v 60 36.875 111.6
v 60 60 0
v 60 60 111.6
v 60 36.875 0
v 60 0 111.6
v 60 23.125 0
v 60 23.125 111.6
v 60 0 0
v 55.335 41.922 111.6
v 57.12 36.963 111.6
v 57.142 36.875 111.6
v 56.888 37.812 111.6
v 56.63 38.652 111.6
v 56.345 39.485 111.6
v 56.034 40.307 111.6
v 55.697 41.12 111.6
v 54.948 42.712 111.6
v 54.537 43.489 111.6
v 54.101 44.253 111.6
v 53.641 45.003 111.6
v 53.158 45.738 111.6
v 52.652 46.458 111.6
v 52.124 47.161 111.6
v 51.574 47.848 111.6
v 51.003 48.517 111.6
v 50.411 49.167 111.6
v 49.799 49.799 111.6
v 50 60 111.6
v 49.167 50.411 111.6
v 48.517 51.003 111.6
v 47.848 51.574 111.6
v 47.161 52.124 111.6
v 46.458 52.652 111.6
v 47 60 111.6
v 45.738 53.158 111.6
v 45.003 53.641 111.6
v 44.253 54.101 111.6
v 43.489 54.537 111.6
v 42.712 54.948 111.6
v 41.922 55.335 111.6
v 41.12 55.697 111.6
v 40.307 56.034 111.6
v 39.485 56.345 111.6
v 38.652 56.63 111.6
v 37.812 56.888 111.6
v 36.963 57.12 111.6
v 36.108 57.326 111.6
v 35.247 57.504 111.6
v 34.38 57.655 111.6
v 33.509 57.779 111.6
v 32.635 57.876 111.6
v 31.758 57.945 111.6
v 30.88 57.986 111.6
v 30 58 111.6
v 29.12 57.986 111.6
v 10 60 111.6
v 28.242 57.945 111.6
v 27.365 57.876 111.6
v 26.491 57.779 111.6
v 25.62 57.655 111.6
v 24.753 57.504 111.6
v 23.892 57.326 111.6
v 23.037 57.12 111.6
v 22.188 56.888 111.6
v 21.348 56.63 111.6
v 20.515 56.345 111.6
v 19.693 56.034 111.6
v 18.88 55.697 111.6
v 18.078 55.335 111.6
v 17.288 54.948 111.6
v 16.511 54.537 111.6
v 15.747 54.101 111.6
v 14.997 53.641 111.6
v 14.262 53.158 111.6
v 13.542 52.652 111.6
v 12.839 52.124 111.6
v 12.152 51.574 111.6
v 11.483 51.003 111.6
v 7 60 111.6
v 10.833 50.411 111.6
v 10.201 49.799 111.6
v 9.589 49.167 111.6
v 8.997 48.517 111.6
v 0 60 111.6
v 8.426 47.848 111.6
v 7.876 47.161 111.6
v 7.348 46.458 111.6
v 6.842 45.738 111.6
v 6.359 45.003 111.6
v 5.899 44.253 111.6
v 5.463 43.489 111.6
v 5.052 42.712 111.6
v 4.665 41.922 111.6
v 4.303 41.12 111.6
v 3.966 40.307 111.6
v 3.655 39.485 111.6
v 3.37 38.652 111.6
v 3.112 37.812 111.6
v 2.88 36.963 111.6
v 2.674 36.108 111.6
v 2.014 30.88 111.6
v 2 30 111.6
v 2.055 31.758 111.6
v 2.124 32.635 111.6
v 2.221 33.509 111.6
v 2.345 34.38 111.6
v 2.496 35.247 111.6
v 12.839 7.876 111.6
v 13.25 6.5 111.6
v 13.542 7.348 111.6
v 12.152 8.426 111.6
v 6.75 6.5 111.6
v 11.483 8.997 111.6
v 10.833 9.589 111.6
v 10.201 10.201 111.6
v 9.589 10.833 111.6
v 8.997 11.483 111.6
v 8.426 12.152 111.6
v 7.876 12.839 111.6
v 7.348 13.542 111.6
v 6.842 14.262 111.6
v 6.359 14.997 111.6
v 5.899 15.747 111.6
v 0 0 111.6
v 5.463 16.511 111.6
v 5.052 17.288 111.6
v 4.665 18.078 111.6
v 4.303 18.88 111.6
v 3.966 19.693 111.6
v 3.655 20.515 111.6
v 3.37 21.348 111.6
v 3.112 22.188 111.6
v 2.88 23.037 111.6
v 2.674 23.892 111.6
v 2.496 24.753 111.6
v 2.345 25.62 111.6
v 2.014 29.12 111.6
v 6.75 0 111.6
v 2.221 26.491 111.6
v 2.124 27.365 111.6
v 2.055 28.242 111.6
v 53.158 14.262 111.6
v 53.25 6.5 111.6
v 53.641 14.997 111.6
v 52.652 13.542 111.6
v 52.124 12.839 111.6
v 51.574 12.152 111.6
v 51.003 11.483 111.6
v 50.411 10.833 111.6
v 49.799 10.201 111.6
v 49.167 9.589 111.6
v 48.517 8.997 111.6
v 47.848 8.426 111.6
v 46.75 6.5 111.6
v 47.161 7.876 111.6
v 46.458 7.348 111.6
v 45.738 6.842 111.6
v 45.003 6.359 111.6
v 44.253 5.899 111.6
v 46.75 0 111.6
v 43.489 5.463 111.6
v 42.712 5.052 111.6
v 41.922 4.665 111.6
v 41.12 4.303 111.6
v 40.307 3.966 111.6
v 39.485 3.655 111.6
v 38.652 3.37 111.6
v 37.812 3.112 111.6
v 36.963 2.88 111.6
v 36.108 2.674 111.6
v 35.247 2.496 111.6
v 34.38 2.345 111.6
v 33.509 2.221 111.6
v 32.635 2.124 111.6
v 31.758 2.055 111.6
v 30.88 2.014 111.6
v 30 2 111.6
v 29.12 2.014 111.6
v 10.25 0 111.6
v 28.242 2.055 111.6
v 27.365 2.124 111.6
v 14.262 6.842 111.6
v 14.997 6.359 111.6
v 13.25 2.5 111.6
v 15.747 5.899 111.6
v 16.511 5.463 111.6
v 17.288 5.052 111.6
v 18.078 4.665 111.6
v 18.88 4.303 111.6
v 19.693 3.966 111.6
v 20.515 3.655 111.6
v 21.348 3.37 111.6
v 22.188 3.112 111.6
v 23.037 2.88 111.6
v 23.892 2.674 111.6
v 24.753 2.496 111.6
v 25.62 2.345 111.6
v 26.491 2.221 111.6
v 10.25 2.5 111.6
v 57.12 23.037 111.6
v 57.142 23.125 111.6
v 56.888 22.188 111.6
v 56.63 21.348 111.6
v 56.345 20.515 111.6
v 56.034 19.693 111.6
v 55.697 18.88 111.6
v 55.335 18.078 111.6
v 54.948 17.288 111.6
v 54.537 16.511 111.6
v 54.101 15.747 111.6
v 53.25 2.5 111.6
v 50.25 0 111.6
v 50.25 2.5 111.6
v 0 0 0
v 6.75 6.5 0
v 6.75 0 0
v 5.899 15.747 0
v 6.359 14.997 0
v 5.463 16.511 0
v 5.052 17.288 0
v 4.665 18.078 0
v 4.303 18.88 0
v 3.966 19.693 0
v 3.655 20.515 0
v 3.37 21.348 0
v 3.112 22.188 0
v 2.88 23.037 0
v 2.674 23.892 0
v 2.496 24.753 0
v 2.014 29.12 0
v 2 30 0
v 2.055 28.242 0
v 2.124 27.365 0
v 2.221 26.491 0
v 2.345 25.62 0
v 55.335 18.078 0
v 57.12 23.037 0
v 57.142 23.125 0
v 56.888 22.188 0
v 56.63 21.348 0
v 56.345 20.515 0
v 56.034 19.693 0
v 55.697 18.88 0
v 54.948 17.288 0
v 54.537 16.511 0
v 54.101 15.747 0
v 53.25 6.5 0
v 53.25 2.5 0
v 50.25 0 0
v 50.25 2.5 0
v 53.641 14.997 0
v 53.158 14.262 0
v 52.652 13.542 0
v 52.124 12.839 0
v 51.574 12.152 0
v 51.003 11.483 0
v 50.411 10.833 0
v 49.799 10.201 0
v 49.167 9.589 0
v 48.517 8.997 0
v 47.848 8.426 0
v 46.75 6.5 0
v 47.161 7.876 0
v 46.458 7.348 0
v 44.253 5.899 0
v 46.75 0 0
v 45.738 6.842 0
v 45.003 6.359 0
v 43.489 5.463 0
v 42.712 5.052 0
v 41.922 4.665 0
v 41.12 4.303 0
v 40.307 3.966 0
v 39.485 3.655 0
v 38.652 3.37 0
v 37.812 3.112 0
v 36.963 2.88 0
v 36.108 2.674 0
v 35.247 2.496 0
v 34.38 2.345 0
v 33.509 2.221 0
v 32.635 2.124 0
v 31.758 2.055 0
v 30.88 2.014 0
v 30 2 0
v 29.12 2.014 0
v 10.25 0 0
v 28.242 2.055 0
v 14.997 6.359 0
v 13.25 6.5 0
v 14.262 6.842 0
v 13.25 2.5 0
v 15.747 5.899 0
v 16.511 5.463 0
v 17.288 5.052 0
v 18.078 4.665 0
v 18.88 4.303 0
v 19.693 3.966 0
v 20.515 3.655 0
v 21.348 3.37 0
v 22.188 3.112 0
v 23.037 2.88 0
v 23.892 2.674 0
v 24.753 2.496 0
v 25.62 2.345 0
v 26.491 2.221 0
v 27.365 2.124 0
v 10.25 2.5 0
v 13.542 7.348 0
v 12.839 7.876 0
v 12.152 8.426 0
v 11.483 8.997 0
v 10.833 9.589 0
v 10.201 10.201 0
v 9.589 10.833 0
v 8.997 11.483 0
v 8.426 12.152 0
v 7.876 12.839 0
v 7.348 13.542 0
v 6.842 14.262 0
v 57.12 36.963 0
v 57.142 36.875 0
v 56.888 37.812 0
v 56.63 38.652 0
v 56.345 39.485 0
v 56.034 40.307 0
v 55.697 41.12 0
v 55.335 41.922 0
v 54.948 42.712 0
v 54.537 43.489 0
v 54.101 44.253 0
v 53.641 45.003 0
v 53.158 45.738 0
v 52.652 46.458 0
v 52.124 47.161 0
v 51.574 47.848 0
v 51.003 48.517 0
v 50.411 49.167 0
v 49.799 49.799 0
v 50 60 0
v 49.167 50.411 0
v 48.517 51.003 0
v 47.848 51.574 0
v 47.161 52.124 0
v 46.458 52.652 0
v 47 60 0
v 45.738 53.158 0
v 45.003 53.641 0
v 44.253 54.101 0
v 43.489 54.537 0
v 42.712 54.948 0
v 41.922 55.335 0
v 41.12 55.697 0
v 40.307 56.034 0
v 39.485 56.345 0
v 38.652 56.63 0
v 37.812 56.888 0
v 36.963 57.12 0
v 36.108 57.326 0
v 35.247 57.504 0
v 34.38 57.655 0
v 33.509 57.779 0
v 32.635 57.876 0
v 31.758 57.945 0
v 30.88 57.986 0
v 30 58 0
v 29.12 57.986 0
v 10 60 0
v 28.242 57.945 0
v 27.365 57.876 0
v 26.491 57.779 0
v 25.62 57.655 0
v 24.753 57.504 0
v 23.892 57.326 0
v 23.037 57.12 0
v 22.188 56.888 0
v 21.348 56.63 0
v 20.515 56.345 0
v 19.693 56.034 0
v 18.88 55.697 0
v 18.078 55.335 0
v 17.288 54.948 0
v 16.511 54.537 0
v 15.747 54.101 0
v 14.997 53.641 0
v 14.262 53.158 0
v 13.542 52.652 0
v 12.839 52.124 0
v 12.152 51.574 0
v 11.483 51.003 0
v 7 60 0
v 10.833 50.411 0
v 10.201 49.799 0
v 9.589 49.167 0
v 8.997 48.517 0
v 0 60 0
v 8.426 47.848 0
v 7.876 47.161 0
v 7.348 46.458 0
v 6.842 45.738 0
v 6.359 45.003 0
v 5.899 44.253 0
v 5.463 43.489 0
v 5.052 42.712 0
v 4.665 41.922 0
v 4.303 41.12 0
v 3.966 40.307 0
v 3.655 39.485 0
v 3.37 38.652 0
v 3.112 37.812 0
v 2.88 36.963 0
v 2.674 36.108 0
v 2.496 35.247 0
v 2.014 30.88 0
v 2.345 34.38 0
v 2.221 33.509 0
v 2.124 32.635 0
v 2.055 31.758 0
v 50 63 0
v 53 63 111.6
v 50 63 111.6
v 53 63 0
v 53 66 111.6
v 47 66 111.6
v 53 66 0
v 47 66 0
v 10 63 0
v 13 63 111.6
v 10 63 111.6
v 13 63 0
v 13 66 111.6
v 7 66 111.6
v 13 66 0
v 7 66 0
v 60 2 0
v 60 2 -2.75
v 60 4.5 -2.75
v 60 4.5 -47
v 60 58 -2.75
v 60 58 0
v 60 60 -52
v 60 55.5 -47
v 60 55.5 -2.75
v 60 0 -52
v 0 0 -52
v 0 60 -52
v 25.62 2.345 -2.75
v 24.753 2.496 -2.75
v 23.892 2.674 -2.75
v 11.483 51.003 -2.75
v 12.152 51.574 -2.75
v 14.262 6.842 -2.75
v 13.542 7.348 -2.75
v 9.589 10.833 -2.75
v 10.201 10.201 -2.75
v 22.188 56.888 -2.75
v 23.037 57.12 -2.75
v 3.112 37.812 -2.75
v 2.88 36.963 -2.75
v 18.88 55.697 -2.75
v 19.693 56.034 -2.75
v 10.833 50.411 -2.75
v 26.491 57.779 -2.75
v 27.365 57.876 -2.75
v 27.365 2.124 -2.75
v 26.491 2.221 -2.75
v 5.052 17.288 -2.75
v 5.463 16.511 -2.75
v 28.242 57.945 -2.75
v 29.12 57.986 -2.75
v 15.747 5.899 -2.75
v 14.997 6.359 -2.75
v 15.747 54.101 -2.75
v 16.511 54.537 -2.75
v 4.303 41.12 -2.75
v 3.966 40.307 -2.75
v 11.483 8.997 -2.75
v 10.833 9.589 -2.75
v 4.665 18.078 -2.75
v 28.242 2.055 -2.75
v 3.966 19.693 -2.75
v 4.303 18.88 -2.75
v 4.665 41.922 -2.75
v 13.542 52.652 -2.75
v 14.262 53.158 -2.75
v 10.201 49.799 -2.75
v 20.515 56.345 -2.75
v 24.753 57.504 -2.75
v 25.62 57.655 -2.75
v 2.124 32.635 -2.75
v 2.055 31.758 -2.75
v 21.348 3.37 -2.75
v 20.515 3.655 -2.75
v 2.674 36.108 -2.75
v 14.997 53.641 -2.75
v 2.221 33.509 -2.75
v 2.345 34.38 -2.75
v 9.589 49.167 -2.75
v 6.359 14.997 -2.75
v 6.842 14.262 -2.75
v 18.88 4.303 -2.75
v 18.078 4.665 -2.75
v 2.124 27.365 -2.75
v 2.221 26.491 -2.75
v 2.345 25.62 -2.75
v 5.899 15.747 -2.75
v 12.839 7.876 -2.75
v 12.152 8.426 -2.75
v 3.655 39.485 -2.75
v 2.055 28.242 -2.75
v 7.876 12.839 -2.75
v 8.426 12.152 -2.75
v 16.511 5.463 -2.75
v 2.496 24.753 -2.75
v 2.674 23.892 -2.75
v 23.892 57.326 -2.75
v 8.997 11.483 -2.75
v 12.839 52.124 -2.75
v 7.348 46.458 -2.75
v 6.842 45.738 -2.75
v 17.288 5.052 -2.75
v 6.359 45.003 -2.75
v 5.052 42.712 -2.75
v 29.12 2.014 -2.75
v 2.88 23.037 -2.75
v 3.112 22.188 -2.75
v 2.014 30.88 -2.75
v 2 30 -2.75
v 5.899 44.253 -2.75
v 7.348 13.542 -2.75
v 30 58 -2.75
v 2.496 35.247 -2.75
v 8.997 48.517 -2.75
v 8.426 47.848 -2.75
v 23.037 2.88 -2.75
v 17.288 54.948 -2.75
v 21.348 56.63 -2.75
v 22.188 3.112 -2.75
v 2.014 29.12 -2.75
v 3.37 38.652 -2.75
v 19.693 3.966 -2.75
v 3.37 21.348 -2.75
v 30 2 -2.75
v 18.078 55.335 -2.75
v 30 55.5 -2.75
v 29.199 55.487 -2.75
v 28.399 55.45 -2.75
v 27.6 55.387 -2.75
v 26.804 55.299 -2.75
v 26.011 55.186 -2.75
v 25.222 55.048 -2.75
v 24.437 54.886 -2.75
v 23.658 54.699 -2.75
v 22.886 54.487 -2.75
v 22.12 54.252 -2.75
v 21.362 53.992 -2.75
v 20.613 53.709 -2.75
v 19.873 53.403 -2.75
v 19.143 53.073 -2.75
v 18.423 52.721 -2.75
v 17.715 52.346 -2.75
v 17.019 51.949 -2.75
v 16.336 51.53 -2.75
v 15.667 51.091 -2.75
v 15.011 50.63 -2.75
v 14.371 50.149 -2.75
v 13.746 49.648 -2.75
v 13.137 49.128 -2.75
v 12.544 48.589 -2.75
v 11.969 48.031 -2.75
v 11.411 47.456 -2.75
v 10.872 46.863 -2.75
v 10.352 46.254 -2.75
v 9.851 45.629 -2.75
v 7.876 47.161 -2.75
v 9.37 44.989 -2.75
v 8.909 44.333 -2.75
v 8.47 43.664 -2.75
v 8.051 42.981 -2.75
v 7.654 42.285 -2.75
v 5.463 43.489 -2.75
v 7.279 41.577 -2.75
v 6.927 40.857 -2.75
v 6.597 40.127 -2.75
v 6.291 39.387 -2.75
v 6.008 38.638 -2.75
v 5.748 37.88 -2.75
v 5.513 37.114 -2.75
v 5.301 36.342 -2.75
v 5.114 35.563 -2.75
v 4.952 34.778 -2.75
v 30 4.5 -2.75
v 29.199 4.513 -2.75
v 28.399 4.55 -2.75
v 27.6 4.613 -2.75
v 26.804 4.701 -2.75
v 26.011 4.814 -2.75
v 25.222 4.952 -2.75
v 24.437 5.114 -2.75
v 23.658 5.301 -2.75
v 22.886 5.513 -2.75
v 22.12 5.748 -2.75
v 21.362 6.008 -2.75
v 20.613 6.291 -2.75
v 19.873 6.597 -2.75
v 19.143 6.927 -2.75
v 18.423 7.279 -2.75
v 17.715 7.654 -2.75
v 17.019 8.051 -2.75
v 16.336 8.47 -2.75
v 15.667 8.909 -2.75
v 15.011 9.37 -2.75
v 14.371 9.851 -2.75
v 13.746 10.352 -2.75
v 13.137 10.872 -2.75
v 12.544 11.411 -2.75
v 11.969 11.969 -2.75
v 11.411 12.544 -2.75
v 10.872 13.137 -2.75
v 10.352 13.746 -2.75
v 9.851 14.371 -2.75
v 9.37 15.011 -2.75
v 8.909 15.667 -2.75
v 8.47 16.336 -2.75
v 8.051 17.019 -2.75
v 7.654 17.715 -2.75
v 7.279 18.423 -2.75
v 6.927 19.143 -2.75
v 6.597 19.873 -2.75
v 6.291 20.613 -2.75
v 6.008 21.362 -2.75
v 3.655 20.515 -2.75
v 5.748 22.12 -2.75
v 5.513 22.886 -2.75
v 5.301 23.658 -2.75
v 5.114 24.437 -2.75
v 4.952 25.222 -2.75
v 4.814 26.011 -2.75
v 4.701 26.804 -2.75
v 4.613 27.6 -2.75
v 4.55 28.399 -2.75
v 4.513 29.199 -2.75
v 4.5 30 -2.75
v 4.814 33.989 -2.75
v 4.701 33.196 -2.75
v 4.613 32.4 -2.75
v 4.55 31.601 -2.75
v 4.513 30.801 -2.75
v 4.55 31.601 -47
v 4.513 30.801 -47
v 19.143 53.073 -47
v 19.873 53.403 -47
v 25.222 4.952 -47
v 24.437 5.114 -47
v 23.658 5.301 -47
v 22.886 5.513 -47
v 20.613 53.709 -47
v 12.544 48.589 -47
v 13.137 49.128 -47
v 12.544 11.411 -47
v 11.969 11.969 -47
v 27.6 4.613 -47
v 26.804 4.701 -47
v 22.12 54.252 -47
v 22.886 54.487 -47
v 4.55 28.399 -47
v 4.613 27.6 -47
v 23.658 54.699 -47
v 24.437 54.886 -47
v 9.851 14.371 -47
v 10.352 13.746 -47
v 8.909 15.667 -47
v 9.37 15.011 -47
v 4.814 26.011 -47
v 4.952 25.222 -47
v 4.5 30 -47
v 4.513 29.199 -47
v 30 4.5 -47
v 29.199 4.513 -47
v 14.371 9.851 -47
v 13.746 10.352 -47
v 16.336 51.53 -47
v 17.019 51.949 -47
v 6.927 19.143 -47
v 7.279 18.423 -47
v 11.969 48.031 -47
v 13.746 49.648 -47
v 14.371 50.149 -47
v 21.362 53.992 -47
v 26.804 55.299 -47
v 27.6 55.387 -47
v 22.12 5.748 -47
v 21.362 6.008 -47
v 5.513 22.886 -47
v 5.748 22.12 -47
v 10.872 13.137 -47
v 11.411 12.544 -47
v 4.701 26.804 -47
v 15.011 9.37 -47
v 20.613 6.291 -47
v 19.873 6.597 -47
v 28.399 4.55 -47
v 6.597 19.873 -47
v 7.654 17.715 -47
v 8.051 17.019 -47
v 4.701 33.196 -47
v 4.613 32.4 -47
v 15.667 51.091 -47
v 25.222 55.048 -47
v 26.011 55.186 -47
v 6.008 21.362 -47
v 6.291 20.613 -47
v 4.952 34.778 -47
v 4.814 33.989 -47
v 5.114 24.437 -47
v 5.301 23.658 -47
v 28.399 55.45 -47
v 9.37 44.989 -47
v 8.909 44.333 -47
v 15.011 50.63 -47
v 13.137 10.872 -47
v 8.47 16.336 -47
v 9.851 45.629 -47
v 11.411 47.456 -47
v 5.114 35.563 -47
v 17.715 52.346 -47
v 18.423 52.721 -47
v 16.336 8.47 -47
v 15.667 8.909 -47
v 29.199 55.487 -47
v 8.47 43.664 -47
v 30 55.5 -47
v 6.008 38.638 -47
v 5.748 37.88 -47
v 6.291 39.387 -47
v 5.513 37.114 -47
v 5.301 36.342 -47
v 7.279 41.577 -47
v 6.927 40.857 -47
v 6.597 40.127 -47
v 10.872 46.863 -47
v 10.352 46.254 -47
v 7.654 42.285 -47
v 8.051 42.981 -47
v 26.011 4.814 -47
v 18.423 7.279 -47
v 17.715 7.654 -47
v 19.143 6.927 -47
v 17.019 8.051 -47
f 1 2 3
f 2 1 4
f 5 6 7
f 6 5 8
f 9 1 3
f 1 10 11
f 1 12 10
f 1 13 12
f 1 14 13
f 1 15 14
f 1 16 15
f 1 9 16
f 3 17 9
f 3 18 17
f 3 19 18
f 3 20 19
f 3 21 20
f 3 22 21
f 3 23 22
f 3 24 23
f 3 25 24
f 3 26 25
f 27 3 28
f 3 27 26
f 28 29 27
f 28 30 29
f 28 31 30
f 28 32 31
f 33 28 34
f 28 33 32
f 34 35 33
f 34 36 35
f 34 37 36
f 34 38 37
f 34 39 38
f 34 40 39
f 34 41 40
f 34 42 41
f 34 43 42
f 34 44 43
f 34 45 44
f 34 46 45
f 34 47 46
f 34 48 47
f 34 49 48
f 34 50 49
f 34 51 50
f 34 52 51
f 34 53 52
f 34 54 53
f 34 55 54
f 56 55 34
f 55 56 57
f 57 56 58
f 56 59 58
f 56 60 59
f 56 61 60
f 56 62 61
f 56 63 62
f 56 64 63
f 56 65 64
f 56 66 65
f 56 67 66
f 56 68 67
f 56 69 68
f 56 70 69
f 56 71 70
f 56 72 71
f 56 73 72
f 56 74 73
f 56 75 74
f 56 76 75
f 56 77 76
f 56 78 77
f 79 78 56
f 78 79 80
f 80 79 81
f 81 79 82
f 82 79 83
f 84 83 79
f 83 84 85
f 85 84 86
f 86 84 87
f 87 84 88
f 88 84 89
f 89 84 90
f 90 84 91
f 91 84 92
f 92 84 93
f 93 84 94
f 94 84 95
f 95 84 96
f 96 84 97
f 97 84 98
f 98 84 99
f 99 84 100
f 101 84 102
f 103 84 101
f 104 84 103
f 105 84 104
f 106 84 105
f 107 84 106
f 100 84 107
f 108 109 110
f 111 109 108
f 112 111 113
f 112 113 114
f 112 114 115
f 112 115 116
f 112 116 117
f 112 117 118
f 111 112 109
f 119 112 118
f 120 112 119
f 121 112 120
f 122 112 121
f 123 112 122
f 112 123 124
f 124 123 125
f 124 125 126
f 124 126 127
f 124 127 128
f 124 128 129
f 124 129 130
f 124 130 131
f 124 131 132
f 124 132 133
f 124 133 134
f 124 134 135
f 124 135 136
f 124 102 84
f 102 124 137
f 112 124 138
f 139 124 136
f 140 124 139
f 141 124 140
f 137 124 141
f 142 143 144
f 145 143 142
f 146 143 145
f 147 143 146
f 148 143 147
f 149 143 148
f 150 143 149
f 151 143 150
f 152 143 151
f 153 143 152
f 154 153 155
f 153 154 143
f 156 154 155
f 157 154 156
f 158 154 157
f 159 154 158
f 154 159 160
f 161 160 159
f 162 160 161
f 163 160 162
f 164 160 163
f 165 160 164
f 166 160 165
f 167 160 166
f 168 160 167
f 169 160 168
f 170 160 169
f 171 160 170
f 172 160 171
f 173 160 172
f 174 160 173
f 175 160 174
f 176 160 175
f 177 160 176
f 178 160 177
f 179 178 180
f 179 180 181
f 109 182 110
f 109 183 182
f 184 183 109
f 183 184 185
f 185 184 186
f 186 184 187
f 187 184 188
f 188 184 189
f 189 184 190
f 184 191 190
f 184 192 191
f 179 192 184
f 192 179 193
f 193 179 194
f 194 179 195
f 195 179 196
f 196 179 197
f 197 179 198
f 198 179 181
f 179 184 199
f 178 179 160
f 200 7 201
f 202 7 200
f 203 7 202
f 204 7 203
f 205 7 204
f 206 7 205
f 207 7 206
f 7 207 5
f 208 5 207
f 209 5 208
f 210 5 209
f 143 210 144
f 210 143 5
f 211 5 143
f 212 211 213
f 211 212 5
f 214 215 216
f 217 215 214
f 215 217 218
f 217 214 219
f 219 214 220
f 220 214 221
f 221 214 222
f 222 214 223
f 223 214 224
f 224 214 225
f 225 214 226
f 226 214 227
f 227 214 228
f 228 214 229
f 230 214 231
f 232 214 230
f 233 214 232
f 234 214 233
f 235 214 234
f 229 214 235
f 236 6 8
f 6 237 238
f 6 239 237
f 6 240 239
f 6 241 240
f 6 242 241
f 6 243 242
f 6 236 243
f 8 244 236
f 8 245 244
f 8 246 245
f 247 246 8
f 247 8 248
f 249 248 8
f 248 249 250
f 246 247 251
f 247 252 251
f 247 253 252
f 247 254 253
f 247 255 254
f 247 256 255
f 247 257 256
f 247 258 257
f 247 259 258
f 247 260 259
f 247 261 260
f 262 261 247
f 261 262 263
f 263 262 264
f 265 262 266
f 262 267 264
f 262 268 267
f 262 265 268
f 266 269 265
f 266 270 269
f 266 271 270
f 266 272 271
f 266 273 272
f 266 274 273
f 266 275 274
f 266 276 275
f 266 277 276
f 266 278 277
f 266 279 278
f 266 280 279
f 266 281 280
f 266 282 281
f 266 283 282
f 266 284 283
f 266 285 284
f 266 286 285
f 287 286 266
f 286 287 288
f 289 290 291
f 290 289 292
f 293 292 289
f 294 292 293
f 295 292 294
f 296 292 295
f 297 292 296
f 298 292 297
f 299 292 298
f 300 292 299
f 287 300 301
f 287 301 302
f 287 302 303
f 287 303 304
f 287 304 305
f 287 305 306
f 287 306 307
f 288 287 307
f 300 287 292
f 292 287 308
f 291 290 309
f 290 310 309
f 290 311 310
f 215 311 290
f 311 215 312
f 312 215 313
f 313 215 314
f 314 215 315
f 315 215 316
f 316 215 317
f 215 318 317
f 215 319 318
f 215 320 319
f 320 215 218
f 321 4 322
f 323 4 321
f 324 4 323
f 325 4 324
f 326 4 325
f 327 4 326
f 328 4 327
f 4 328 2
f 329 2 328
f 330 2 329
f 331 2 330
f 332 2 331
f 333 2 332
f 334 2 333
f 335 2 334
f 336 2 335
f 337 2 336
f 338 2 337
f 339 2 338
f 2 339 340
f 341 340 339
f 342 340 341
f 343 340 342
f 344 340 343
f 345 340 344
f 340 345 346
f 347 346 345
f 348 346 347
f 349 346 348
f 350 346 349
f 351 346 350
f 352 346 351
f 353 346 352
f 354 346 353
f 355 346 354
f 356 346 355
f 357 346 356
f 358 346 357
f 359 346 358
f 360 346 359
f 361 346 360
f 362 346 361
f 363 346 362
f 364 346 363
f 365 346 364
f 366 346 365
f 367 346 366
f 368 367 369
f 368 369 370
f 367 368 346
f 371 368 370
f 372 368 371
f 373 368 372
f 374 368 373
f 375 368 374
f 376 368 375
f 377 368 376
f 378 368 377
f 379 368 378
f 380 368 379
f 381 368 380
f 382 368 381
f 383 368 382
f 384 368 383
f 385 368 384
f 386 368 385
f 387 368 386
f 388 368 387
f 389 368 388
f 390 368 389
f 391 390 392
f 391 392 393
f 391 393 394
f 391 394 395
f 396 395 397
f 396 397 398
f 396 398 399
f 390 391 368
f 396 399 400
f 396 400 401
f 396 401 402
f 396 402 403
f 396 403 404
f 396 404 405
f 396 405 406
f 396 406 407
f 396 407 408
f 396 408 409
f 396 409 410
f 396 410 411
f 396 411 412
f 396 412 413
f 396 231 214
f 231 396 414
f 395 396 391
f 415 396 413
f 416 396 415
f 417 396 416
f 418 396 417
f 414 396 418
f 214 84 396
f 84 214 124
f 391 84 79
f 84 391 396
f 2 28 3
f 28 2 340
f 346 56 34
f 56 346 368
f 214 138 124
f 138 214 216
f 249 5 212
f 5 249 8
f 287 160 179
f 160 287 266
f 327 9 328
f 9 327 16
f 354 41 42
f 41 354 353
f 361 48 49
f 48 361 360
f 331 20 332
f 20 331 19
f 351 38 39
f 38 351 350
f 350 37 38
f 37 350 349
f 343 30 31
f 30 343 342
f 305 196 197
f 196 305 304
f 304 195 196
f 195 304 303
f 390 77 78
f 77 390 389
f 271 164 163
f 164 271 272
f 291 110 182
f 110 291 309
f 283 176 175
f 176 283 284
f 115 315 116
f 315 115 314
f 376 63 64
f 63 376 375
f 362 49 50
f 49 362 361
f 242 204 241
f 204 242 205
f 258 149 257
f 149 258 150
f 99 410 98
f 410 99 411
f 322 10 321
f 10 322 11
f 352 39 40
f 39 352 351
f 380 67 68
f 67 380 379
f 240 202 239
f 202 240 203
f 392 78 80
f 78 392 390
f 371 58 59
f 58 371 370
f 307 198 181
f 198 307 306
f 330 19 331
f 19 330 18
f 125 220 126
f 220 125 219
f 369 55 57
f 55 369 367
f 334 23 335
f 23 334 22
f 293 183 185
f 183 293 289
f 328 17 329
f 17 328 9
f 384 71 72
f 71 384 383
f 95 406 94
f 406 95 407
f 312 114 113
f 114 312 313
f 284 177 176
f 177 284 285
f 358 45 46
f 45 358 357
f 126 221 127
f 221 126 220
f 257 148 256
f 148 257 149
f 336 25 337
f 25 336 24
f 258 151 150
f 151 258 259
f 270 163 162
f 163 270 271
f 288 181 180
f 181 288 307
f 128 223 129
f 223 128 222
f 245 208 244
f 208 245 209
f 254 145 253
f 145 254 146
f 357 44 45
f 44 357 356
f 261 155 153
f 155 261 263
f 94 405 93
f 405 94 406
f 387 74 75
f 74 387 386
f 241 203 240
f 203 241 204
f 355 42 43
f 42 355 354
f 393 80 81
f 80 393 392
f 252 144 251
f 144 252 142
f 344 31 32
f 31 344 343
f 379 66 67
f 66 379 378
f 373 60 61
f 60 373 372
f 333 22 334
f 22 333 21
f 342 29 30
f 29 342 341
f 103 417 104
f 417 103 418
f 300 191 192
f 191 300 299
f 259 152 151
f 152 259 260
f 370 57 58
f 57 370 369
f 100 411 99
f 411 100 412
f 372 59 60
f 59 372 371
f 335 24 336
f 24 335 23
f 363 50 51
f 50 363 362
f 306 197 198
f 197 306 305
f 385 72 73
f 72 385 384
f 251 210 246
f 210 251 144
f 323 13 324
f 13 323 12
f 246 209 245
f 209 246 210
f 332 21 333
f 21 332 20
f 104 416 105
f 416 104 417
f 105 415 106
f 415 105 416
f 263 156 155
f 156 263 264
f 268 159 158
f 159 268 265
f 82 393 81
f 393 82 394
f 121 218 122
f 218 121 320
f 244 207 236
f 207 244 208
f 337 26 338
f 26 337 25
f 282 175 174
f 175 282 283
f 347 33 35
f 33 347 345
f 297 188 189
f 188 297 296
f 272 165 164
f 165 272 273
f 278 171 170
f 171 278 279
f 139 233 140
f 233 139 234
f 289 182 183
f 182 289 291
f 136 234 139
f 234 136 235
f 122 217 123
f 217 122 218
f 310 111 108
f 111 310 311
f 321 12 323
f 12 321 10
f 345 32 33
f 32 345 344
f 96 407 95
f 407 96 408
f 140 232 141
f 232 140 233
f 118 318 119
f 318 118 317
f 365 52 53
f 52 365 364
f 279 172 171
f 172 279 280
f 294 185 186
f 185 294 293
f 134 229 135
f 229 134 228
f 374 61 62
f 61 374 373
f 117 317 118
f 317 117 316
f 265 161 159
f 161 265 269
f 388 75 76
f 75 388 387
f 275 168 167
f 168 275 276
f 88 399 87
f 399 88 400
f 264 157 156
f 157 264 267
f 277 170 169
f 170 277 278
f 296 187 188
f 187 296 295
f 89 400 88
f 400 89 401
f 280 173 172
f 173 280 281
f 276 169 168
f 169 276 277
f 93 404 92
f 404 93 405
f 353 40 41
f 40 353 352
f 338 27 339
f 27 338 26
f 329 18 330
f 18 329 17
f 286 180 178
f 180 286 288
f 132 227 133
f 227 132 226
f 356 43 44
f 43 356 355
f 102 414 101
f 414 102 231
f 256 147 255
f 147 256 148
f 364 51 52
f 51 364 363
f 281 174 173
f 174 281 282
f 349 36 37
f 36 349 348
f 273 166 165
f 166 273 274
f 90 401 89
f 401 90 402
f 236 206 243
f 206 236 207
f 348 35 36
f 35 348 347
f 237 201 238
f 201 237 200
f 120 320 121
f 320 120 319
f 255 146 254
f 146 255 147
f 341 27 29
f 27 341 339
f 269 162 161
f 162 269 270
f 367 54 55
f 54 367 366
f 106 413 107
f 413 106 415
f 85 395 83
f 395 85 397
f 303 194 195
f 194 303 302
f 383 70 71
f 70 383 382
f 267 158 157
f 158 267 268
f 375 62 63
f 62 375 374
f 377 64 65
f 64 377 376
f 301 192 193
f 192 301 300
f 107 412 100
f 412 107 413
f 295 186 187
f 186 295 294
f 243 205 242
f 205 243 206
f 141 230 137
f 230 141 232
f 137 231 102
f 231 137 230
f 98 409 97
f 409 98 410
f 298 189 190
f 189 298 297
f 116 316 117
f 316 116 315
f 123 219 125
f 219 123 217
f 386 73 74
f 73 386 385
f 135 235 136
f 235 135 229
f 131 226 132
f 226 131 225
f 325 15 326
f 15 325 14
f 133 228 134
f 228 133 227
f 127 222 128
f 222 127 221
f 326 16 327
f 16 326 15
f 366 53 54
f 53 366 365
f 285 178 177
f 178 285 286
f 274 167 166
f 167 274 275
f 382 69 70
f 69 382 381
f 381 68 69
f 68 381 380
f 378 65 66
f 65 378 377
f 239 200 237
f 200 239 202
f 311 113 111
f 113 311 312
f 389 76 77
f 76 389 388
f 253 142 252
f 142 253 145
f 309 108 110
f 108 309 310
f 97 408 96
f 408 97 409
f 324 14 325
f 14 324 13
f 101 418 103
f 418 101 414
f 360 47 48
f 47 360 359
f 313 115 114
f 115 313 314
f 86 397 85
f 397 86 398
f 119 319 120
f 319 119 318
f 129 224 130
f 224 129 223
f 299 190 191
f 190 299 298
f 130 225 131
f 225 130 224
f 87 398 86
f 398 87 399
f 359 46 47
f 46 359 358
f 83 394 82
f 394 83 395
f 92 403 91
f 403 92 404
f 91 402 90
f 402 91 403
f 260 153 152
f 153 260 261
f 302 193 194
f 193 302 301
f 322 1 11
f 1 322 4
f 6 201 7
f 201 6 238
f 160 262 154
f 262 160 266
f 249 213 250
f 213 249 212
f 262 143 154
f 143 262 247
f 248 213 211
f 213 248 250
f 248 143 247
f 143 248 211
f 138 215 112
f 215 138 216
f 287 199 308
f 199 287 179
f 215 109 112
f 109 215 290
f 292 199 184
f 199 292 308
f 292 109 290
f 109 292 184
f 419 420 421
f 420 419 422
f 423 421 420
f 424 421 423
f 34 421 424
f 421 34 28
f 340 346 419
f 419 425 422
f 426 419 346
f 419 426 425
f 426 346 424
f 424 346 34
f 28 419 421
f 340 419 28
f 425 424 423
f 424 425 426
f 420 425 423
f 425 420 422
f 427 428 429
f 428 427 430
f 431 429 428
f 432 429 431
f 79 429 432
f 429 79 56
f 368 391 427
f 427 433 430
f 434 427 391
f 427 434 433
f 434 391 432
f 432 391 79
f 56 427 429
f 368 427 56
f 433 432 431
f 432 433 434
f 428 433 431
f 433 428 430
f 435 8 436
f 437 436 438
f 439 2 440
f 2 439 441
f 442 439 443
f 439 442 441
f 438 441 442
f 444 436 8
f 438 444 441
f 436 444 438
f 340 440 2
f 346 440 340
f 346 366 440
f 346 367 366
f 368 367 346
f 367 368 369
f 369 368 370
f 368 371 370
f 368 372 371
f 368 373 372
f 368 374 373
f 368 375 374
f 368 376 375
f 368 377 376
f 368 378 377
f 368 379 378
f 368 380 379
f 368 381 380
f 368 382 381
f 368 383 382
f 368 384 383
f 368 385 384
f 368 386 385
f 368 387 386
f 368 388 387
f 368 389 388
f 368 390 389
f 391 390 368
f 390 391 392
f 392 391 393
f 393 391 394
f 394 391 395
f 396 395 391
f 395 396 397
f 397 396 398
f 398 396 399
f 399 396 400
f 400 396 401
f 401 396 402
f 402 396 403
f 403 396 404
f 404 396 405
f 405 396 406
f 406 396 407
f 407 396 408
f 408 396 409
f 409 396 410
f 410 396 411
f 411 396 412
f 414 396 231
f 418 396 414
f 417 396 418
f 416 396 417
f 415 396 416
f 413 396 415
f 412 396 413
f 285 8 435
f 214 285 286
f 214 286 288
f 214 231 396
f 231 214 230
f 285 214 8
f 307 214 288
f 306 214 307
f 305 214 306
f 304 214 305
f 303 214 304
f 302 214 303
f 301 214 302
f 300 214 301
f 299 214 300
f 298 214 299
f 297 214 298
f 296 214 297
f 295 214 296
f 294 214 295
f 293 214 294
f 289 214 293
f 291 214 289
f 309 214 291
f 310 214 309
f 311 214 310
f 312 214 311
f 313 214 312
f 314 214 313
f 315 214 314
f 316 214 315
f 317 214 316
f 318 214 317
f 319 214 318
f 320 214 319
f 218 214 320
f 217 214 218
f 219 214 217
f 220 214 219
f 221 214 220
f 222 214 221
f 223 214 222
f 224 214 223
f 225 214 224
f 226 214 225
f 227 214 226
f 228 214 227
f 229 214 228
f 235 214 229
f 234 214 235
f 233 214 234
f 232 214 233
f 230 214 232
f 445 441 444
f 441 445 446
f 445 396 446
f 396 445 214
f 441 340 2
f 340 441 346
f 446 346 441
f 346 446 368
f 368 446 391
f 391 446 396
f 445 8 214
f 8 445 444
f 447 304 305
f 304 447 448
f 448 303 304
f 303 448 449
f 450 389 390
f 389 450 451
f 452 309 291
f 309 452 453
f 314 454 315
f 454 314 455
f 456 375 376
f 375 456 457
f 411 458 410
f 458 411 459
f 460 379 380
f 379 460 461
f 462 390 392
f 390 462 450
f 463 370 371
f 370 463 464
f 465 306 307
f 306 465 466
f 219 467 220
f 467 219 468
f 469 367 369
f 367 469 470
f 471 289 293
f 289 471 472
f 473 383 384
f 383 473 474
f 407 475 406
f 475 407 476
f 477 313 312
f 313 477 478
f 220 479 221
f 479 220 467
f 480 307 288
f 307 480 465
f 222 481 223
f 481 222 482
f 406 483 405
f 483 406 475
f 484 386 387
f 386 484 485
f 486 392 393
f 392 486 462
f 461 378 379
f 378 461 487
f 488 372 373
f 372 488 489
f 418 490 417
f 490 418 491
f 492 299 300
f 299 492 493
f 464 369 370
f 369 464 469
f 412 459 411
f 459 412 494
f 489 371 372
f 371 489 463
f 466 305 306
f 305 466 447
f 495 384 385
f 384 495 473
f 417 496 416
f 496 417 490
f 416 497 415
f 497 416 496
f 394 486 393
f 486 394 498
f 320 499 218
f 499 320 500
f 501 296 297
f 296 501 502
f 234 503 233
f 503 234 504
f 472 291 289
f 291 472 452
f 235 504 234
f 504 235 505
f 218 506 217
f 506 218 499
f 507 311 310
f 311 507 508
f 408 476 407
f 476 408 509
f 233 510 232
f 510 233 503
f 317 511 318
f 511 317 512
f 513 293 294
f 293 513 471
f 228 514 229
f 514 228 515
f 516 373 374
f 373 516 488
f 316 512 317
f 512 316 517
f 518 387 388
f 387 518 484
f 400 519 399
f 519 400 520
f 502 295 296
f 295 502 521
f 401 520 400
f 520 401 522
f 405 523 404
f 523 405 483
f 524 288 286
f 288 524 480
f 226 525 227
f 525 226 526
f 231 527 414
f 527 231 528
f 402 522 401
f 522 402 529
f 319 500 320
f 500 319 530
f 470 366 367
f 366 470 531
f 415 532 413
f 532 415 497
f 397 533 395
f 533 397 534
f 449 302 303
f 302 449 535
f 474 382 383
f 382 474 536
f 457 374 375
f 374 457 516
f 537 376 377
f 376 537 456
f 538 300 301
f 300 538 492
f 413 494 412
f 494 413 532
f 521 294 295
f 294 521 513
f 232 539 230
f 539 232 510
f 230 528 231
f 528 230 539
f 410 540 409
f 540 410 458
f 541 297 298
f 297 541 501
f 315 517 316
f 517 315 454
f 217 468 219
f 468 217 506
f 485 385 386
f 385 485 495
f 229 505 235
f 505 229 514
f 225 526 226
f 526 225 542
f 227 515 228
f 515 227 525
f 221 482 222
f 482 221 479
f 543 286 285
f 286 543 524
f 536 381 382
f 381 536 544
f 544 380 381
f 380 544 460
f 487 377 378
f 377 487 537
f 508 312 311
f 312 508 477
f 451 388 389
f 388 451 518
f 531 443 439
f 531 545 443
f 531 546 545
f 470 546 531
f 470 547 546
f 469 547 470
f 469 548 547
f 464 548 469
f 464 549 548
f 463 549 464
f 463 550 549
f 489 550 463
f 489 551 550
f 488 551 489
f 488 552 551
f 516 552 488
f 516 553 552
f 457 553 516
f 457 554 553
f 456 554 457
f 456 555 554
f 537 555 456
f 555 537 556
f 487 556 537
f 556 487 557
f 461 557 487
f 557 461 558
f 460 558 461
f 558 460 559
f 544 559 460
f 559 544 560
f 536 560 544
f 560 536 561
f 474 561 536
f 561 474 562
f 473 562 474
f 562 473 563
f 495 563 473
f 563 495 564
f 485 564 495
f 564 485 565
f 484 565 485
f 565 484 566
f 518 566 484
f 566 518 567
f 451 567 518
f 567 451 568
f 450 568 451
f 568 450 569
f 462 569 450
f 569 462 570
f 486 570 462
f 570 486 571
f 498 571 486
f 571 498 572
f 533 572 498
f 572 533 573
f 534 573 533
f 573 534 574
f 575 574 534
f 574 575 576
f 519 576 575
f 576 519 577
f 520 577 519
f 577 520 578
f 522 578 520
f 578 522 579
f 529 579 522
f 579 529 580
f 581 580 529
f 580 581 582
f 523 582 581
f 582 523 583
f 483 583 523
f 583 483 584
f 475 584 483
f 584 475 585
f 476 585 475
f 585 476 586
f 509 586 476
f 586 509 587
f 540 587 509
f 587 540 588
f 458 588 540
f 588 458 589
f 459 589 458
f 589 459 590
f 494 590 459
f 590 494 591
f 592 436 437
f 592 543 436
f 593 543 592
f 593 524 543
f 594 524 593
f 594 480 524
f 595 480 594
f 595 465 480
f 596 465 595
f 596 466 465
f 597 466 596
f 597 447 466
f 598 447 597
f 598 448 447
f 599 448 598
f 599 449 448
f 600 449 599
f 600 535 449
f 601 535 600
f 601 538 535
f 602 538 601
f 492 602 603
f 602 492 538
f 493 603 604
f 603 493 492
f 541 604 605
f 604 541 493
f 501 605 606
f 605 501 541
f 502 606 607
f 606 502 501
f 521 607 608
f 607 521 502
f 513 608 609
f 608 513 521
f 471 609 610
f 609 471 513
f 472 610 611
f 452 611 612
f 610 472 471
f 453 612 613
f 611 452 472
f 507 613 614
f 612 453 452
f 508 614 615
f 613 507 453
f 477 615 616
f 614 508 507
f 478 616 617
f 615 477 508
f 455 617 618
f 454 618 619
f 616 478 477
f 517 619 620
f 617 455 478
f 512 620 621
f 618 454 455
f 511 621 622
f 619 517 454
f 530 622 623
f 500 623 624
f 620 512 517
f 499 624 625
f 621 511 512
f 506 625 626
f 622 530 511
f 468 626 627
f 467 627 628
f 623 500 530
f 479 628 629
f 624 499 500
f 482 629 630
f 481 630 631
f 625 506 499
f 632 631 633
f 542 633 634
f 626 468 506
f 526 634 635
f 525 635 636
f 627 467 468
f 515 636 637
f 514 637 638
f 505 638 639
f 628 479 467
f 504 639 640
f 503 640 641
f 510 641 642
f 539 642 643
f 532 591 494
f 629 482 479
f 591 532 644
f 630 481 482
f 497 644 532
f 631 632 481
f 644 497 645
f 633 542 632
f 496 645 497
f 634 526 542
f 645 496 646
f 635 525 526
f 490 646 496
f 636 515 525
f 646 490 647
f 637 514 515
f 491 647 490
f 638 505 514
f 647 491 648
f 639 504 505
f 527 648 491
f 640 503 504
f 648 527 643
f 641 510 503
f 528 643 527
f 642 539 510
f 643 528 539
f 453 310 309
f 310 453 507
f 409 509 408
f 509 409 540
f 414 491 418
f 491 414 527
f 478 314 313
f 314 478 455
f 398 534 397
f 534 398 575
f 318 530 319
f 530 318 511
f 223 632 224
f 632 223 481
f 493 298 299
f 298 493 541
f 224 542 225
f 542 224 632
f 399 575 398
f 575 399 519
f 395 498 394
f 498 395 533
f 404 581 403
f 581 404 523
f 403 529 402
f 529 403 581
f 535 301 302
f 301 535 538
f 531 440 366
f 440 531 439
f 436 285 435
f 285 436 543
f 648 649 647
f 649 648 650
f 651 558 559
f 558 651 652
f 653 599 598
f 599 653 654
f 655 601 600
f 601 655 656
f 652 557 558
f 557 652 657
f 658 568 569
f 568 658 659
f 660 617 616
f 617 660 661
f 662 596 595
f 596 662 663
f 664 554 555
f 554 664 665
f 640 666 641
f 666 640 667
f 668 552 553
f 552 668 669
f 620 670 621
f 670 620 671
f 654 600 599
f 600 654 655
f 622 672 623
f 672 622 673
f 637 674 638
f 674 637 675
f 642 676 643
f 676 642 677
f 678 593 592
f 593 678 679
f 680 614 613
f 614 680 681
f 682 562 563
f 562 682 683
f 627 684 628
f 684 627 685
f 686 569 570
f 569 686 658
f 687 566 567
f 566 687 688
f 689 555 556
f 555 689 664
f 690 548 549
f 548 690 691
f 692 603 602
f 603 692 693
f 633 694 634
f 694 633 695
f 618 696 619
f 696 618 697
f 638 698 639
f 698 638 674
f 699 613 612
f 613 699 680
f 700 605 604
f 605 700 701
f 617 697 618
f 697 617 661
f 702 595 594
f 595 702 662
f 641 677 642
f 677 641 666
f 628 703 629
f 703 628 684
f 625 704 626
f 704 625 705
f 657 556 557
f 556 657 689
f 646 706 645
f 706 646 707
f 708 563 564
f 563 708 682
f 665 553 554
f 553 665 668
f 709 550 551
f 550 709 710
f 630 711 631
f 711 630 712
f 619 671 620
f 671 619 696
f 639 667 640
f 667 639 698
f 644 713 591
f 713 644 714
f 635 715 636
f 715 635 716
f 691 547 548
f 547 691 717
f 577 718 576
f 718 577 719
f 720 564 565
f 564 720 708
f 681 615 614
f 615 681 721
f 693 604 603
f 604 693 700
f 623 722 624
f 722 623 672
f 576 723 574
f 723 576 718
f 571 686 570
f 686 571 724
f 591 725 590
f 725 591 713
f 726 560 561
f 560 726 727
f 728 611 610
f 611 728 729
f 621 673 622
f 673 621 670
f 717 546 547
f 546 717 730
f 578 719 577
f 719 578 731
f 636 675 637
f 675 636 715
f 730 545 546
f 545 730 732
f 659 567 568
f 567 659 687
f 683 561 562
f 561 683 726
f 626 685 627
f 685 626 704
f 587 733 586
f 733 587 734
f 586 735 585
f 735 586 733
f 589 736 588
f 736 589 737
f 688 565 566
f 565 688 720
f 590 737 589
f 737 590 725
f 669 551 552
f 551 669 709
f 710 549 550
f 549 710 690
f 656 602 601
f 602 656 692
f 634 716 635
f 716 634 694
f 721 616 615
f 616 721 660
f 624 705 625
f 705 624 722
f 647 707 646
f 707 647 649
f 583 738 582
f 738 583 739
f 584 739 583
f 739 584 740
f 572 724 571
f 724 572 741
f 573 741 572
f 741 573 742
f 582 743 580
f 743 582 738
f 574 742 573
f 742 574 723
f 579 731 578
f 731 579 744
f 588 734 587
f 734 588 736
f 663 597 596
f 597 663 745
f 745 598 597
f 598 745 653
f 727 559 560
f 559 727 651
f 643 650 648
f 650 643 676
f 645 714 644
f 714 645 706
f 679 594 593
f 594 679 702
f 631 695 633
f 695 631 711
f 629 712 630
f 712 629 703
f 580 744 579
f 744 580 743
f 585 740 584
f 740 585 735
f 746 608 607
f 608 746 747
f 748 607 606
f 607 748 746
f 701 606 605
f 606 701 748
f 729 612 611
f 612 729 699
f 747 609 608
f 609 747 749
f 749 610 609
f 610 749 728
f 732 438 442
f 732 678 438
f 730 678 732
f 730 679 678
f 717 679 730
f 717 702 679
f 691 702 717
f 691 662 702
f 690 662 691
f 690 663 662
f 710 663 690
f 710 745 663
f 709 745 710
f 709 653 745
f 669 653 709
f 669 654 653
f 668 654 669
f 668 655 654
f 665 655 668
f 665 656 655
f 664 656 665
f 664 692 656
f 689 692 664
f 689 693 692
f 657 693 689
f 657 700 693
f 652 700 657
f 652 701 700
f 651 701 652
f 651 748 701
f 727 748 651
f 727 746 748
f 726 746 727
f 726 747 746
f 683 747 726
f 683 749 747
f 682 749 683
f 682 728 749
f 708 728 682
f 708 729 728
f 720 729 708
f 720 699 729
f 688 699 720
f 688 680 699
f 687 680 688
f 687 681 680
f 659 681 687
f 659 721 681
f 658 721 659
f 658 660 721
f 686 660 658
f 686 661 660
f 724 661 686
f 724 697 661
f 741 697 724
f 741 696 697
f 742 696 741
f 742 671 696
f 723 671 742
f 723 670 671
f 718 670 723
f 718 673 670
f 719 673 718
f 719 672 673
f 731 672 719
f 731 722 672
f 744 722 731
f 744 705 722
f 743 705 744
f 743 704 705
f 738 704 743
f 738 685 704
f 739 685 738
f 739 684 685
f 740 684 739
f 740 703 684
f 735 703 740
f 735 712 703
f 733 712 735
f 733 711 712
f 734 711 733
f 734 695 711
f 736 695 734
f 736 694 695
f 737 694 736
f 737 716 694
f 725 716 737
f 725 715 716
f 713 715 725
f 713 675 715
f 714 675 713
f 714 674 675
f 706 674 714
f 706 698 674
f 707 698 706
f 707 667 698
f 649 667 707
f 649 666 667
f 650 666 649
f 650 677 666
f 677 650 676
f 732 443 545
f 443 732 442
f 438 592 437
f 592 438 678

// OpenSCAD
/* [Assembly] */

// Is the capsule holder an assemblable thing (true) or not (false)
is_assemblable = 1; // [1:true, 0:false]
// Is the capsule holder a starting piece (true) or an end/middle piece (false)
is_starter = 1; // [1:true, 0:false]
// Is the capsule holder an end piece (true) or a starting/middle piece (false)
is_end = 0; // [1:true, 0:false]

/* [Size & look] */

// Should this piece have a bottom box to grab the capsules (false) or is it just an extension tower (true)
tower_only = 0; // [1:true, 0:false]
// How many caps in total should the holder contain?
nb_caps = 4;

/* [Capsule Info] */

// Height of the capsule
capsule_height = 37;
// Radius of the lid of the capsule
capsule_cap_diameter = 55;
// Radius of the capsule without the lid
capsule_cap_under_diameter = 51;

/* [Other] */

// Size of the clips (should not be modified unless you see there is a problem with the clips)
clips_thickness = 3;

/* [Hidden] */

assemblable = is_assemblable == 1;
starter = assemblable && (is_starter == 1);
end = assemblable && (is_end == 1) && !starter;

module clip_male(height){
	rotate([0,0,90]){
	cube([clips_thickness,clips_thickness,height]);
	translate([clips_thickness + (clips_thickness/2.0) ,0 , height/2.0]) cube([clips_thickness,2*clips_thickness,height], center = true);
	}
}

module clip_female(height){
	rotate([0,0,90]){
	translate([0, -0.25, 0])cube([clips_thickness, clips_thickness + 0.5 , height]);
	translate([clips_thickness - 0.5, -(clips_thickness + 0.25), 0]) cube([clips_thickness + 1,(2*clips_thickness) + 0.5,height]);
	}
}

module chemney_by_nb_caps(nb_caps){
	size_z = (capsule_height + 0.2) * (nb_caps);
	chemney_by_size(size_z);
}

module chemney_by_size(height){
	translate([ (capsule_cap_diameter + 5) /2.0, (capsule_cap_diameter + 5) /2.0 , 0]){
	difference(){
		translate([0,0,height/2.0])difference(){
			cube([capsule_cap_diameter + 5, capsule_cap_diameter + 5, height], center = true);
			cylinder(r = capsule_cap_diameter/2.0 + 0.5, h=height, center = true, $fn = 200);
			translate([2.5,0,0])cube([capsule_cap_diameter , capsule_cap_diameter / 4.0, height], center = true);
		}

		if(assemblable || starter){ //add clip holes
			translate([0, -(capsule_cap_diameter + 5) / 2.0, 0]){
				translate([(capsule_cap_diameter + 25) / 4.0 ,0,0])clip_female(height);
				translate([-(capsule_cap_diameter + 25) / 4.0 ,0,0])clip_female(height);
			}
		}
	}
	if(assemblable || end){ //add clips
		translate([0, (capsule_cap_diameter + 5) / 2.0, 0]){
			translate([(capsule_cap_diameter + 25) / 4.0 ,0,0])clip_male(height);
			translate([-(capsule_cap_diameter + 25) / 4.0 ,0,0])clip_male(height);
		}
	}
	}
}



chemney_by_nb_caps(nb_caps - (-1*(tower_only-1)));
// and now for the base
if (tower_only == 0){
translate([0,0, -(capsule_height + 15)])translate([(capsule_cap_diameter +5)/2.0, (capsule_cap_diameter +5)/2.0, (capsule_height + 15)/2.0])difference(){
	cube([capsule_cap_diameter +5, capsule_cap_diameter +5, capsule_height + 15], center = true);

	translate([0,0,(capsule_height + 12.5)/2.0])
		cylinder(r = (capsule_cap_diameter + 1) /2.0, h=3, center = true, $fn = 200);
	translate([(capsule_cap_diameter  + 1) / 2.0, 0 , (capsule_height + 12.5)/2.0])
		cube([capsule_cap_diameter + 1, capsule_cap_diameter + 1, 3], center = true);

	translate([0,0,5/2.0])
		cylinder(r = (capsule_cap_under_diameter) /2.0, h=capsule_height + 10, center = true, $fn = 200);
	translate([(capsule_cap_under_diameter) / 2.0, 0 , 5/2.0])
		cube([capsule_cap_under_diameter, capsule_cap_under_diameter, capsule_height + 10], center = true);
}
}
